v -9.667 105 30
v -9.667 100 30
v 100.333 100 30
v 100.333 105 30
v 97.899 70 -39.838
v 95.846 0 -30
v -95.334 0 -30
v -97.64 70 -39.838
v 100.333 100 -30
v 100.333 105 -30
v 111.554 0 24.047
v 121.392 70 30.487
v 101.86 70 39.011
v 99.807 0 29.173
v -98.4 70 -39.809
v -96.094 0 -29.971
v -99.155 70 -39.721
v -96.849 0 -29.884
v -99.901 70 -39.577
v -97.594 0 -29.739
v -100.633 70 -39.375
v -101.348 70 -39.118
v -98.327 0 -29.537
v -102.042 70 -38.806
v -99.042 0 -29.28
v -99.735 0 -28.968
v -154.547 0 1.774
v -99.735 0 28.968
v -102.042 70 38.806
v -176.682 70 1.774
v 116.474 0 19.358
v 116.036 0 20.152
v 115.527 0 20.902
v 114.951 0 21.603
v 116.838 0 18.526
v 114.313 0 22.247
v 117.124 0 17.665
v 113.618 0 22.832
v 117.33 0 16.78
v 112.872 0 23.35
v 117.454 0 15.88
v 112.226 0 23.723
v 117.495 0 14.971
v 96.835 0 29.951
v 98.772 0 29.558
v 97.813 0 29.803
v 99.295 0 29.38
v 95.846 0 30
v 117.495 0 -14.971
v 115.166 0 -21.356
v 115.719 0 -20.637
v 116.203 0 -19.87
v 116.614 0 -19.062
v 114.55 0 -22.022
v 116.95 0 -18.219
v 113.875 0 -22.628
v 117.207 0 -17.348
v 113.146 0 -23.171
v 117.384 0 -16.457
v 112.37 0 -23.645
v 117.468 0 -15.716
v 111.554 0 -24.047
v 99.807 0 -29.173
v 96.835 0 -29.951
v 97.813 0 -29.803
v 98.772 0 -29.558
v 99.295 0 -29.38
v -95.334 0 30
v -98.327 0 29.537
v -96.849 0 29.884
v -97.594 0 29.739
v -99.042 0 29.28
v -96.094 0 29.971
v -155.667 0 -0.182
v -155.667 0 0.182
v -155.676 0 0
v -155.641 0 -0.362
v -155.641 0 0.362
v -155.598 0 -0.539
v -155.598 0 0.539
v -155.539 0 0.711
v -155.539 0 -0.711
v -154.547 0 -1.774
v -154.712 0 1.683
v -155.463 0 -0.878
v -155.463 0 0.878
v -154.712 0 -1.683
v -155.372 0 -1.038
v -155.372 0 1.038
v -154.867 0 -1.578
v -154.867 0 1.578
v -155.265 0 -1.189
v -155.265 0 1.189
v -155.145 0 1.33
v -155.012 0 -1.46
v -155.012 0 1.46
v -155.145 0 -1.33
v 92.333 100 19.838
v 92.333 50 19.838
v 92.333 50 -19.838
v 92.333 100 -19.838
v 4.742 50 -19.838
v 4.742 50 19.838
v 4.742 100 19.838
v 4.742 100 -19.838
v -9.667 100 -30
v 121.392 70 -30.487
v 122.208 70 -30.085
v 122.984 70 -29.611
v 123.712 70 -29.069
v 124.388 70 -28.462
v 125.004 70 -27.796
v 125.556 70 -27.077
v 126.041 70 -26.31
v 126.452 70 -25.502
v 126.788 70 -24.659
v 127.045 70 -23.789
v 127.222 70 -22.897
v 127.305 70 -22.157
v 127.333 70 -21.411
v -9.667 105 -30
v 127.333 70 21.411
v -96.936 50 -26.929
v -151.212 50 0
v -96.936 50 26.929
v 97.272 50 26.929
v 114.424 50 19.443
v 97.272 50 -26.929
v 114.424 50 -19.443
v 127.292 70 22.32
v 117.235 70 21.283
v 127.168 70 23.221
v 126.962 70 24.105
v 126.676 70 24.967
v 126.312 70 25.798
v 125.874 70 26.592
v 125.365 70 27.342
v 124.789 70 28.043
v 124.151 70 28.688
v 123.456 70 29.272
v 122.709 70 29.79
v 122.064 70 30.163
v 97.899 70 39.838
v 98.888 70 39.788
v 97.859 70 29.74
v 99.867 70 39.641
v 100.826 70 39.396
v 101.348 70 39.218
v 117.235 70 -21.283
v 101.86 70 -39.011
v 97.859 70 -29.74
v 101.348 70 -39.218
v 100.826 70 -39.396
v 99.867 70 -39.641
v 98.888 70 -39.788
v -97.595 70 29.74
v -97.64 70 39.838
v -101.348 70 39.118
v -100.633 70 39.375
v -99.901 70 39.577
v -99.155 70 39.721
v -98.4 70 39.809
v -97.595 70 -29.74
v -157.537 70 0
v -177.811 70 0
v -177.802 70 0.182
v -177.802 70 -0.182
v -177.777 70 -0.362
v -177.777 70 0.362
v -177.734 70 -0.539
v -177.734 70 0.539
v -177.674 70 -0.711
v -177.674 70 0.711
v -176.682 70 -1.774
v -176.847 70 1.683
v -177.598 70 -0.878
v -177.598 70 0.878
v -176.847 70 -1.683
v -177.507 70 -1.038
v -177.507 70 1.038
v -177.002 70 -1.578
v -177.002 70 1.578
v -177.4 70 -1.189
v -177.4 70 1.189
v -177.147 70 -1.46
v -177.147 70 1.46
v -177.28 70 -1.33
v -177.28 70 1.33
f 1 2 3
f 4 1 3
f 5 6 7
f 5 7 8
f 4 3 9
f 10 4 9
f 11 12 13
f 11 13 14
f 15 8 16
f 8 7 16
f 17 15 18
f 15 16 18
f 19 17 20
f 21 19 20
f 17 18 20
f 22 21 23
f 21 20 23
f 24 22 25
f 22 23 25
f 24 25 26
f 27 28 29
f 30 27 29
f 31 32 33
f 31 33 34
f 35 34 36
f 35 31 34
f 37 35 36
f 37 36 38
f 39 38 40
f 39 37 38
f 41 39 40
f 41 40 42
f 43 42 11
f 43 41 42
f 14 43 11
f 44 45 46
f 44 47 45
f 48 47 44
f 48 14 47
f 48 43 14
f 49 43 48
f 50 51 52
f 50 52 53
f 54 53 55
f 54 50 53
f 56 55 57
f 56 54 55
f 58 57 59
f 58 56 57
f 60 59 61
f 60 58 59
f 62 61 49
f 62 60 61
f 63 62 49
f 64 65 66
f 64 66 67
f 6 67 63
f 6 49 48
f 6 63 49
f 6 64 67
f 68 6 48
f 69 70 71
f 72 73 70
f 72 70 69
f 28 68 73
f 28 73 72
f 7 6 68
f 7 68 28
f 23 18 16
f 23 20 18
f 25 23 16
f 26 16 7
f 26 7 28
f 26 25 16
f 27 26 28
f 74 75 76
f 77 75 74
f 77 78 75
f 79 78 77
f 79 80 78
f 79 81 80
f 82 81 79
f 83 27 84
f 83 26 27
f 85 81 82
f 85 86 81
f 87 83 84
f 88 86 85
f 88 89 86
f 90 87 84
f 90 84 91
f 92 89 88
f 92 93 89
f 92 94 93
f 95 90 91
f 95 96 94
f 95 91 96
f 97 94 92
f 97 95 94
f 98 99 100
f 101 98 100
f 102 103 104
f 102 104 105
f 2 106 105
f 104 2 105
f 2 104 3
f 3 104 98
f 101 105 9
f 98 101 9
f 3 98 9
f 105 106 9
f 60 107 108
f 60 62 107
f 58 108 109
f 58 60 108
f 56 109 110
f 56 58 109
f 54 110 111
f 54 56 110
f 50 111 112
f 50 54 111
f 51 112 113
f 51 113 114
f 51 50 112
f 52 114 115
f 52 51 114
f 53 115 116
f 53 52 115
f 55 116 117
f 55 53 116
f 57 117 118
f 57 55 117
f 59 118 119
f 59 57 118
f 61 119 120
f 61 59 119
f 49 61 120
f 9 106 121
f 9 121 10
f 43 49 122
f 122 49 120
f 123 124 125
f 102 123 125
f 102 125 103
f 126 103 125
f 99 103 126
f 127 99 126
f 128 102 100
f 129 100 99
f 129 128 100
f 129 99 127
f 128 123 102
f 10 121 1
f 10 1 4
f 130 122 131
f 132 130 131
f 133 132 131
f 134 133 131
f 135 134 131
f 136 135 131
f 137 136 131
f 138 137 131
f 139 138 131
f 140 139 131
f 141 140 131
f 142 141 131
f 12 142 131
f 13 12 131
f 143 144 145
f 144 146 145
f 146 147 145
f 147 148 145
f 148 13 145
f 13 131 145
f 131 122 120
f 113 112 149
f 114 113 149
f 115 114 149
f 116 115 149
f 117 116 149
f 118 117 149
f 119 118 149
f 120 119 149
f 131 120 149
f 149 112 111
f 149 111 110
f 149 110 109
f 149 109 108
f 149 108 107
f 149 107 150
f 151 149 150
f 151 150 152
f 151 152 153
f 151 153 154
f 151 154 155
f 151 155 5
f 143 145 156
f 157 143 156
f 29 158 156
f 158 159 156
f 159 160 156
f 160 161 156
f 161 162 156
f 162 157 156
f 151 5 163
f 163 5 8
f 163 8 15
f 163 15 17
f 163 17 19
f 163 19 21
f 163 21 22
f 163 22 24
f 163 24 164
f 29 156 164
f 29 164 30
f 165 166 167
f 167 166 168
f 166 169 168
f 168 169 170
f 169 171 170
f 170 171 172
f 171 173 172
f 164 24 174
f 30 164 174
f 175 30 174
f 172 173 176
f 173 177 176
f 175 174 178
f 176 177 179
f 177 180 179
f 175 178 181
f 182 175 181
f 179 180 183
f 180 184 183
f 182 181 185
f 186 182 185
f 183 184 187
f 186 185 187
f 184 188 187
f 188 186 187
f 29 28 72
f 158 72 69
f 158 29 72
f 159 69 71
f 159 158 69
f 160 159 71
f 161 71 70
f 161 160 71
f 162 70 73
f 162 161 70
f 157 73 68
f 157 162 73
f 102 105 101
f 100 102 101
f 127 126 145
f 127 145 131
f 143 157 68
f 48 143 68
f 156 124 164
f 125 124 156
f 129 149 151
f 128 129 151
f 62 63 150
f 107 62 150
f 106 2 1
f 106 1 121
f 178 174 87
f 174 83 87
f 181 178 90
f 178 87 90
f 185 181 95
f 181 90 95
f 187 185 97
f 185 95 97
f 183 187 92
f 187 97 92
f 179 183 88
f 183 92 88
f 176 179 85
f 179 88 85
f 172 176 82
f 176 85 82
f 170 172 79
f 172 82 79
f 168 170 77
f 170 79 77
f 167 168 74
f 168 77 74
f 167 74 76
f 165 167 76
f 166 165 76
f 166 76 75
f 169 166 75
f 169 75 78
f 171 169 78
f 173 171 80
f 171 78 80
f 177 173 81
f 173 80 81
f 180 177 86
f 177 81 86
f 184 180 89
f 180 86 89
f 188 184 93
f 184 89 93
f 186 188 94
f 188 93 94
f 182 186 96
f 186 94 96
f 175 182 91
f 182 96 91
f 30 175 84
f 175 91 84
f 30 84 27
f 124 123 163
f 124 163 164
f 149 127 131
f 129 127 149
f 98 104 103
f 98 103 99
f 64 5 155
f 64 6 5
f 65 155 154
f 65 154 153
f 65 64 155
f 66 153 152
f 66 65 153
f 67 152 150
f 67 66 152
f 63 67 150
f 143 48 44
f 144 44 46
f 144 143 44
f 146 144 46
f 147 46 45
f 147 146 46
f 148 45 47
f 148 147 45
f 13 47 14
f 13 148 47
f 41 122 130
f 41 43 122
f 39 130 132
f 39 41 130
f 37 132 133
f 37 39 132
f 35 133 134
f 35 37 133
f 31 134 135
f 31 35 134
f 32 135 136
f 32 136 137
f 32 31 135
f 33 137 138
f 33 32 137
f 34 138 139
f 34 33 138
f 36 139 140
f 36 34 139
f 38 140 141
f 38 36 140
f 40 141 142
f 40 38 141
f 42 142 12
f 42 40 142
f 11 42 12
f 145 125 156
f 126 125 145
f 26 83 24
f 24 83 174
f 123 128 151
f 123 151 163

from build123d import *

# Parameters (mm, degrees)
SALIENTE_EXTRUIR1_DEPTH = 70
CHAFL_N1_SIZE           = 71.153697224
CHAFL_N1_SIZE_2         = 10
CHAFL_N2_SIZE           = 10
CHAFL_N2_SIZE_2         = 71.153697224
CHAFL_N3_SIZE           = 10
CHAFL_N3_SIZE_2         = 71.153697224
CHAFL_N4_SIZE           = 10
CHAFL_N4_SIZE_2         = 71.153697224
CHAFL_N6_SIZE           = 10
CHAFL_N6_SIZE_2         = 71.153697224
CHAFL_N7_SIZE           = 71.153697224
CHAFL_N7_SIZE_2         = 10
CHAFL_N8_SIZE           = 10
CHAFL_N8_SIZE_2         = 71.153697224
VACIADO2_DEPTH          = 20
VACIADO2_DRAFT          = -8
CROQUIS3_W              = 87.591071548
CROQUIS3_H              = 39.675716858
SALIENTE_EXTRUIR3_DEPTH = 30
CROQUIS4_W              = 110
CROQUIS4_H              = 60
SALIENTE_EXTRUIR4_DEPTH = 5
REDONDEO2_R             = 2
REDONDEO4_R             = 10
REDONDEO5_R             = 10


# Read off the part's stored shape, not the designer's step: Vaciado2
with BuildPart() as part:
    # Croquis1 → Saliente-Extruir1 (new body)
    with BuildSketch(Plane(origin=(0, 0, 0), x_dir=(1, 0, 0), z_dir=(0, 1, 0))):
        Polygon((100, -40), (-100, -40), (-180.622577483, 0), (-100, 40), (100, 40), (127.49545417, 28), (127.49545417, -28), align=None)
    extrude(amount=SALIENTE_EXTRUIR1_DEPTH)

    # Chaflán1
    # the kernel refuses this chamfer: 71.153697224, 10 mm, written as the material it takes off along each edge
    with BuildSketch(Plane(origin=(284.933017826, 0, 40), x_dir=(0, 0.999985663281603, 0.005354739139527623), z_dir=(-1, 0, 0))) as chafl_n1_piece_1:
        Polygon((CHAFL_N1_SIZE * 0.999985663279, CHAFL_N1_SIZE * 0.00535473913952), (-CHAFL_N1_SIZE_2 * 0.00535473913953, CHAFL_N1_SIZE_2 * 0.999985663282), (0, 0), align=None)
    extrude(amount=569.866035651, mode=Mode.SUBTRACT)

    # Chaflán2
    # the kernel refuses this chamfer: 71.153697224, 10 mm, written as the material it takes off along each edge
    with BuildSketch(Plane(origin=(45.508539616, 0, 112.192452367), x_dir=(0.4289599478157497, -0.26166085119417803, -0.8645964157468197), z_dir=(-0.895806416477617, 0, -0.44444444444444353))) as chafl_n2_piece_1:
        Polygon((CHAFL_N2_SIZE * 0.965159882585, -CHAFL_N2_SIZE * 0.261660851194), (-CHAFL_N2_SIZE_2 * 0.261660851194, -CHAFL_N2_SIZE_2 * 0.965159882583), (0, 0), align=None)
    extrude(amount=437.366035651, mode=Mode.SUBTRACT)

    # Chaflán3
    # the kernel refuses this chamfer: 71.153697224, 10 mm, written as the material it takes off along each edge
    with BuildSketch(Plane(origin=(-335.03676147, 0, 76.61088931), x_dir=(0.4289599478157518, -0.2616608511941785, 0.8645964157468186), z_dir=(0.895806416477616, 0, -0.4444444444444457))) as chafl_n3_piece_1:
        Polygon((CHAFL_N3_SIZE * 0.965159882585, -CHAFL_N3_SIZE * 0.261660851194), (-CHAFL_N3_SIZE_2 * 0.261660851194, -CHAFL_N3_SIZE_2 * 0.965159882583), (0, 0), align=None)
    extrude(amount=447.307518774, mode=Mode.SUBTRACT)

    # Chaflán4
    # the kernel refuses this chamfer: 71.153697224, 10 mm, written as the material it takes off along each edge
    with BuildSketch(Plane(origin=(-262.433017825, 0, -40), x_dir=(0, -0.26166085119417826, 0.9651598825854388), z_dir=(1, 0, 0))) as chafl_n4_piece_1:
        Polygon((CHAFL_N4_SIZE * 0.965159882585, -CHAFL_N4_SIZE * 0.261660851194), (-CHAFL_N4_SIZE_2 * 0.261660851194, -CHAFL_N4_SIZE_2 * 0.965159882583), (0, 0), align=None)
    extrude(amount=547.366035651, mode=Mode.SUBTRACT)

    # Chaflán6
    # the kernel refuses this chamfer: 71.153697224, 10 mm, written as the material it takes off along each edge
    with BuildSketch(Plane(origin=(-46.581032062, 0, -103.97320713), x_dir=(-0.3860639530341748, -0.2616608511941783, 0.8845836439364931), z_dir=(0.9165151389911683, 0, 0.3999999999999993))) as chafl_n6_piece_1:
        Polygon((CHAFL_N6_SIZE * 0.965159882585, -CHAFL_N6_SIZE * 0.261660851194), (-CHAFL_N6_SIZE_2 * 0.261660851194, -CHAFL_N6_SIZE_2 * 0.965159882583), (0, 0), align=None)
    extrude(amount=374.866035651, mode=Mode.SUBTRACT)

    # Chaflán7
    # the kernel refuses this chamfer: 71.153697224, 10 mm, written as the material it takes off along each edge
    with BuildSketch(Plane(origin=(296.989364706, 0, -45.97320713), x_dir=(0.002141895655810909, 0.999985663281603, 0.004907699486725296), z_dir=(-0.9165151389911683, 0, 0.3999999999999993))) as chafl_n7_piece_1:
        Polygon((CHAFL_N7_SIZE * 0.999985663279, CHAFL_N7_SIZE * 0.00535473913952), (-CHAFL_N7_SIZE_2 * 0.00535473913953, CHAFL_N7_SIZE_2 * 0.999985663282), (0, 0), align=None)
    extrude(amount=374.866035651, mode=Mode.SUBTRACT)

    # Chaflán8
    # the kernel refuses this chamfer: 71.153697224, 10 mm, written as the material it takes off along each edge
    with BuildSketch(Plane(origin=(127.49545417, 0, -202.022123314), x_dir=(-0.9651598825854388, -0.26166085119417826, 0), z_dir=(0, 0, 1))) as chafl_n8_piece_1:
        Polygon((CHAFL_N8_SIZE * 0.965159882585, -CHAFL_N8_SIZE * 0.261660851194), (-CHAFL_N8_SIZE_2 * 0.261660851194, -CHAFL_N8_SIZE_2 * 0.965159882583), (0, 0), align=None)
    extrude(amount=404.044246628, mode=Mode.SUBTRACT)


with BuildPart() as vaciado2_tool:
    # Vaciado2 outline → Vaciado2 (with draft: the straight prism first)
    with BuildSketch(Plane(origin=(0, 50, 0), x_dir=(1, 0, 0), z_dir=(0, 1, 0))):
        Polygon((114.42422018, 19.442868688), (97.271874618, 26.92876601), (-96.935637901, 26.92876601), (-151.212301005, 0), (-96.935637901, -26.92876601), (97.271874618, -26.92876601), (114.42422018, -19.442868688), align=None)
    extrude(amount=VACIADO2_DEPTH)
    # Vaciado2: the draft: its side faces are tilted about the plane it starts from
    vaciado2_sides = [vaciado2_tool.faces().sort_by_distance(p)[0] for p in [
        (105.848047399, 60, -23.185817349),
        (0.168118358, 60, -26.92876601),
        (-124.073969453, 60, -13.464383005),
        (-124.073969453, 60, 13.464383005),
        (0.168118358, 60, 26.92876601),
        (105.848047399, 60, 23.185817349),
        (114.42422018, 60, 0),
    ]]
    draft(vaciado2_sides, Plane(origin=(0, 50, 0), x_dir=(1, 0, 0), z_dir=(0, 1, 0)), VACIADO2_DRAFT)


with BuildPart() as part_1:
    add(part.part)

    # Vaciado2: cut by vaciado2_tool
    add(vaciado2_tool.part, mode=Mode.SUBTRACT)

    # Croquis3 → Saliente-Extruir3 (add, symmetric)
    with BuildSketch(Plane(origin=(0, 70, 0), x_dir=(1, 0, 0), z_dir=(0, 1, 0))):
        with Locations((48.537776825, 0)):
            Rectangle(CROQUIS3_W, CROQUIS3_H)
    extrude(amount=SALIENTE_EXTRUIR3_DEPTH, both=True)

    # Croquis4 → Saliente-Extruir4 (add)
    with BuildSketch(Plane(origin=(0, 100, 0), x_dir=(1, 0, 0), z_dir=(0, 1, 0))):
        with Locations((45.333312599, 0)):
            Rectangle(CROQUIS4_W, CROQUIS4_H)
    extrude(amount=SALIENTE_EXTRUIR4_DEPTH)

    # Redondeo2
    redondeo2_edges = [part_1.edges().sort_by_distance(p)[0] for p in [
        (-169.190168216, 35, 0),
    ]]
    fillet(redondeo2_edges, radius=REDONDEO2_R)

    # Redondeo4
    redondeo4_edges = [part_1.edges().sort_by_distance(p)[0] for p in [
        (98.939518779, 35, -34.918929215),
        (98.939518779, 35, 34.918929215),
        (122.414383384, 35, -24.673658359),
        (122.414383384, 35, 24.673658359),
    ]]
    fillet(redondeo4_edges, radius=REDONDEO4_R)

    # Redondeo5
    redondeo5_edges = [part_1.edges().sort_by_distance(p)[0] for p in [
        (-98.80881631, 35, 34.918929215),
        (-98.80881631, 35, -34.918929215),
    ]]
    fillet(redondeo5_edges, radius=REDONDEO5_R)


solid = part_1.part
